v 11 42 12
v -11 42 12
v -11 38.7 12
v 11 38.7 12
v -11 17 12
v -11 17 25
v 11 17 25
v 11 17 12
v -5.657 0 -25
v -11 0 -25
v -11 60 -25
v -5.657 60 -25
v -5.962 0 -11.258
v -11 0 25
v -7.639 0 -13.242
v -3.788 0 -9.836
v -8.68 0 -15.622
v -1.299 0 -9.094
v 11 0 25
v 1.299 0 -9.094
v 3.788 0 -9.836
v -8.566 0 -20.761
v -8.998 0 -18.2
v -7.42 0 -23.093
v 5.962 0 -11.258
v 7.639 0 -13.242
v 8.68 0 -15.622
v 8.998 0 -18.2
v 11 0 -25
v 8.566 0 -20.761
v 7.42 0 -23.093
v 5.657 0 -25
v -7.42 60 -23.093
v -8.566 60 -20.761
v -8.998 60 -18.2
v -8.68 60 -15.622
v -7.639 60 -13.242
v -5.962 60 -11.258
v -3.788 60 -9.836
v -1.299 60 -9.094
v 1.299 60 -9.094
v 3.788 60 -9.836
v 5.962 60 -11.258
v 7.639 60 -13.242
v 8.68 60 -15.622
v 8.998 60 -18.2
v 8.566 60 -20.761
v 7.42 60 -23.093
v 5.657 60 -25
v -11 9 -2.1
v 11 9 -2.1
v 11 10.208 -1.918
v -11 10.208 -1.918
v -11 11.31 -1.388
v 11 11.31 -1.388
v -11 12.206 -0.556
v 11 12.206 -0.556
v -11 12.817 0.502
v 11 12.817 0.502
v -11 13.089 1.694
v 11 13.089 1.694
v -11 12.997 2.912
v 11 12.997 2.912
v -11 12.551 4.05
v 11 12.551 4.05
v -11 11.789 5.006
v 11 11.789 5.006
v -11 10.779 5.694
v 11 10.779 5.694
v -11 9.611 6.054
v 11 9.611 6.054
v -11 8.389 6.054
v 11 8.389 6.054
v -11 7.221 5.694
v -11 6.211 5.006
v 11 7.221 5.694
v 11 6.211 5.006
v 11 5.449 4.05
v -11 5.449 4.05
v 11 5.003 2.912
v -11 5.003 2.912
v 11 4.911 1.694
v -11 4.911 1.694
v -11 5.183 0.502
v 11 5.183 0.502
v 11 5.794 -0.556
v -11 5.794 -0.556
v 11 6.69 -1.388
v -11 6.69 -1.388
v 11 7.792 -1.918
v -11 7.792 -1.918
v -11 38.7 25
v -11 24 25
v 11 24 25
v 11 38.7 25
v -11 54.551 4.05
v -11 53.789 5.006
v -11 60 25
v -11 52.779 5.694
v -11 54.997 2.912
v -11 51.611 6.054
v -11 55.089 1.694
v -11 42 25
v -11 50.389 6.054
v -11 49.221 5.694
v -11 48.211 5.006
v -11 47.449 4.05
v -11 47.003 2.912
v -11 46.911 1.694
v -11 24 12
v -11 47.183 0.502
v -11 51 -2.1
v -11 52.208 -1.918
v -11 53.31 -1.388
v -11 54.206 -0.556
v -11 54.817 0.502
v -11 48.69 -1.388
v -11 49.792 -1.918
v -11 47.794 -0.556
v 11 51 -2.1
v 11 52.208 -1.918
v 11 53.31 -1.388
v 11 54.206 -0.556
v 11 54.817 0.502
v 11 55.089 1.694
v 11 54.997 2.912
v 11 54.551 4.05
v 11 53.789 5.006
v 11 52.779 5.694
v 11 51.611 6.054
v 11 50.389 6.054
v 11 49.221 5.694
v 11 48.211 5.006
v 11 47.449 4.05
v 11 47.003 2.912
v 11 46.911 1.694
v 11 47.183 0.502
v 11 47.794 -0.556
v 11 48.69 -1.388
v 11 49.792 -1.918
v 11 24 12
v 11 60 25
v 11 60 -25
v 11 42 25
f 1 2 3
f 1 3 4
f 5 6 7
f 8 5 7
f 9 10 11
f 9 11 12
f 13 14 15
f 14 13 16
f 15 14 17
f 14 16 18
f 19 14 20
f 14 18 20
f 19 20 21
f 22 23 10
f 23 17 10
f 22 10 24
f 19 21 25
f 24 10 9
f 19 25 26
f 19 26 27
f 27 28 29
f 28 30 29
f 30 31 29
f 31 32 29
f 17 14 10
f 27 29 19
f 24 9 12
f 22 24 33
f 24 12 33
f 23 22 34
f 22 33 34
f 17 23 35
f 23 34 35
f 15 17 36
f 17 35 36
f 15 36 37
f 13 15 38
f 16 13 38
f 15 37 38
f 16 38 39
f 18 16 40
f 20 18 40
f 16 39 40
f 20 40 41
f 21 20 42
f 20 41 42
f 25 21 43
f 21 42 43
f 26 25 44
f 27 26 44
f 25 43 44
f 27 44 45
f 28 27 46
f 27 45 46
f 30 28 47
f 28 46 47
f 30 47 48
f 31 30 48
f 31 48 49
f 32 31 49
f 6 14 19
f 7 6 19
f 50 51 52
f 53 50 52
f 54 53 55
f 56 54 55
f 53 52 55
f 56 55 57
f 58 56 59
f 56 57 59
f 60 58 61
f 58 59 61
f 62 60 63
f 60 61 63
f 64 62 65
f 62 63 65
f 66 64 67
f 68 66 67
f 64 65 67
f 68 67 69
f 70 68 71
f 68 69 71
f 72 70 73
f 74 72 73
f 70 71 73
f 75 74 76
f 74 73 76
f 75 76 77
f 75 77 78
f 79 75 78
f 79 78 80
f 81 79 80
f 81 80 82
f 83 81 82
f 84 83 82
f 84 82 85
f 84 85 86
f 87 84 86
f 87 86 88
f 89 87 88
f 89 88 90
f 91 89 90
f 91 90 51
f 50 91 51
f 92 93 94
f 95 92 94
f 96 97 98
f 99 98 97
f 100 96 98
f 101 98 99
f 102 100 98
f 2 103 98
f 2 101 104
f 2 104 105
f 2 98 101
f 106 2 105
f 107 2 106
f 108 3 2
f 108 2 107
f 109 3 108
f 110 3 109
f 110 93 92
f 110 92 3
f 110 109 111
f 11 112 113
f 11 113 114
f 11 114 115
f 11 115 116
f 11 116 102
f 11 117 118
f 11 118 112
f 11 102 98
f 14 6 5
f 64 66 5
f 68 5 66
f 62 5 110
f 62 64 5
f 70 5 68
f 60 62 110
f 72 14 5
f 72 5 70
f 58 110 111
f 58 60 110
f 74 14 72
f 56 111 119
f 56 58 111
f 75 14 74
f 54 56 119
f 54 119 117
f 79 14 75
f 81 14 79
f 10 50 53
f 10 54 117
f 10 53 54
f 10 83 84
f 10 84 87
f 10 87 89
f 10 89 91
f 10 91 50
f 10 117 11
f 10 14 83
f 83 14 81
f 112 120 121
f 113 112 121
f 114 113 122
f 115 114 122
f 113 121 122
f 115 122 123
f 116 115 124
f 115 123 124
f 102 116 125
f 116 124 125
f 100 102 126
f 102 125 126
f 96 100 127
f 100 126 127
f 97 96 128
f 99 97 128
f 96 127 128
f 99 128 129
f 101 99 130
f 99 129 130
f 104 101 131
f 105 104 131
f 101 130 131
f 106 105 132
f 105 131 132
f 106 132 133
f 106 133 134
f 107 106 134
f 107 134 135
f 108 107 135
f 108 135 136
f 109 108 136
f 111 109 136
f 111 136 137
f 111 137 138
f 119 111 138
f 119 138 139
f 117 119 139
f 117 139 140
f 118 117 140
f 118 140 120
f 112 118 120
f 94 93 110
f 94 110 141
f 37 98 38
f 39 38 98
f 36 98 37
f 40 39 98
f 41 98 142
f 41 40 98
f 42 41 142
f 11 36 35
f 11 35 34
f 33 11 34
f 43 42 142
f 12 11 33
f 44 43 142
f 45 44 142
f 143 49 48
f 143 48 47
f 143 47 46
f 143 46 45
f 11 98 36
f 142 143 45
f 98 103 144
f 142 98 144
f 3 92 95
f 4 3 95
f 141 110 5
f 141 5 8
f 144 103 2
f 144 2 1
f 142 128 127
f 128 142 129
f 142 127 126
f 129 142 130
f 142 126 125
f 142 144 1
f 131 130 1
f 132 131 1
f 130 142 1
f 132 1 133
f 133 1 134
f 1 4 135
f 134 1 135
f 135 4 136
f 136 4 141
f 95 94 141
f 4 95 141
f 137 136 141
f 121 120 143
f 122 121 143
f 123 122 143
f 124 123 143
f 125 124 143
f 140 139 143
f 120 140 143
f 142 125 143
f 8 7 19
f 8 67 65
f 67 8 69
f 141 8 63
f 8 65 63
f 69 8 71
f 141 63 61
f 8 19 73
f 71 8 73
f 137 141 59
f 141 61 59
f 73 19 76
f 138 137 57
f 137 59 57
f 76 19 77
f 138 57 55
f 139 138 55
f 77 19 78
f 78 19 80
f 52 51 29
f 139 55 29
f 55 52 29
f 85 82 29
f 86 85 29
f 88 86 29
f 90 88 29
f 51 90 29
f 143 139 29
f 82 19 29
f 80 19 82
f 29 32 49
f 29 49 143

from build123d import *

# Parameters (mm, degrees)
SKETCH1_W           = 22
SKETCH1_H           = 50
BOSS_EXTRUDE1_DEPTH = 60
SKETCH2_R           = 4.1
CUT_EXTRUDE1_DEPTH  = 23
SKETCH4_R           = 9
CUT_EXTRUDE2_DEPTH  = 61
SKETCH5_W           = 22
SKETCH5_H           = 3.3
SKETCH5_H_2         = 7
CUT_EXTRUDE3_DEPTH  = 13


with BuildPart() as part:
    # Sketch1 → Boss-Extrude1 (new body)
    with BuildSketch(Plane(origin=(0, 0, 0), x_dir=(1, 0, 0), z_dir=(0, 1, 0))):
        Rectangle(SKETCH1_W, SKETCH1_H)
    extrude(amount=BOSS_EXTRUDE1_DEPTH)

    # Sketch2 → Cut-Extrude1 (cut, through all)
    with BuildSketch(Plane(origin=(11, 0, 0), x_dir=(0, 0, -1), z_dir=(1, 0, 0))):
        with Locations((-2, 51)):
            Circle(SKETCH2_R)
        with Locations((-2, 9)):
            Circle(SKETCH2_R)
    extrude(amount=-CUT_EXTRUDE1_DEPTH, mode=Mode.SUBTRACT)

    # Sketch4 → Cut-Extrude2 (cut, through all)
    with BuildSketch(Plane(origin=(0, 60, 0), x_dir=(1, 0, 0), z_dir=(0, 1, 0))):
        with Locations((0, 18)):
            Circle(SKETCH4_R)
    extrude(amount=-CUT_EXTRUDE2_DEPTH, mode=Mode.SUBTRACT)

    # Sketch5 → Cut-Extrude3 (cut)
    with BuildSketch(Plane.XY.offset(25)):
        with Locations((0, 40.35)):
            Rectangle(SKETCH5_W, SKETCH5_H)
        with Locations((0, 20.5)):
            Rectangle(SKETCH5_W, SKETCH5_H_2)
    extrude(amount=-CUT_EXTRUDE3_DEPTH, mode=Mode.SUBTRACT)


solid = part.part
